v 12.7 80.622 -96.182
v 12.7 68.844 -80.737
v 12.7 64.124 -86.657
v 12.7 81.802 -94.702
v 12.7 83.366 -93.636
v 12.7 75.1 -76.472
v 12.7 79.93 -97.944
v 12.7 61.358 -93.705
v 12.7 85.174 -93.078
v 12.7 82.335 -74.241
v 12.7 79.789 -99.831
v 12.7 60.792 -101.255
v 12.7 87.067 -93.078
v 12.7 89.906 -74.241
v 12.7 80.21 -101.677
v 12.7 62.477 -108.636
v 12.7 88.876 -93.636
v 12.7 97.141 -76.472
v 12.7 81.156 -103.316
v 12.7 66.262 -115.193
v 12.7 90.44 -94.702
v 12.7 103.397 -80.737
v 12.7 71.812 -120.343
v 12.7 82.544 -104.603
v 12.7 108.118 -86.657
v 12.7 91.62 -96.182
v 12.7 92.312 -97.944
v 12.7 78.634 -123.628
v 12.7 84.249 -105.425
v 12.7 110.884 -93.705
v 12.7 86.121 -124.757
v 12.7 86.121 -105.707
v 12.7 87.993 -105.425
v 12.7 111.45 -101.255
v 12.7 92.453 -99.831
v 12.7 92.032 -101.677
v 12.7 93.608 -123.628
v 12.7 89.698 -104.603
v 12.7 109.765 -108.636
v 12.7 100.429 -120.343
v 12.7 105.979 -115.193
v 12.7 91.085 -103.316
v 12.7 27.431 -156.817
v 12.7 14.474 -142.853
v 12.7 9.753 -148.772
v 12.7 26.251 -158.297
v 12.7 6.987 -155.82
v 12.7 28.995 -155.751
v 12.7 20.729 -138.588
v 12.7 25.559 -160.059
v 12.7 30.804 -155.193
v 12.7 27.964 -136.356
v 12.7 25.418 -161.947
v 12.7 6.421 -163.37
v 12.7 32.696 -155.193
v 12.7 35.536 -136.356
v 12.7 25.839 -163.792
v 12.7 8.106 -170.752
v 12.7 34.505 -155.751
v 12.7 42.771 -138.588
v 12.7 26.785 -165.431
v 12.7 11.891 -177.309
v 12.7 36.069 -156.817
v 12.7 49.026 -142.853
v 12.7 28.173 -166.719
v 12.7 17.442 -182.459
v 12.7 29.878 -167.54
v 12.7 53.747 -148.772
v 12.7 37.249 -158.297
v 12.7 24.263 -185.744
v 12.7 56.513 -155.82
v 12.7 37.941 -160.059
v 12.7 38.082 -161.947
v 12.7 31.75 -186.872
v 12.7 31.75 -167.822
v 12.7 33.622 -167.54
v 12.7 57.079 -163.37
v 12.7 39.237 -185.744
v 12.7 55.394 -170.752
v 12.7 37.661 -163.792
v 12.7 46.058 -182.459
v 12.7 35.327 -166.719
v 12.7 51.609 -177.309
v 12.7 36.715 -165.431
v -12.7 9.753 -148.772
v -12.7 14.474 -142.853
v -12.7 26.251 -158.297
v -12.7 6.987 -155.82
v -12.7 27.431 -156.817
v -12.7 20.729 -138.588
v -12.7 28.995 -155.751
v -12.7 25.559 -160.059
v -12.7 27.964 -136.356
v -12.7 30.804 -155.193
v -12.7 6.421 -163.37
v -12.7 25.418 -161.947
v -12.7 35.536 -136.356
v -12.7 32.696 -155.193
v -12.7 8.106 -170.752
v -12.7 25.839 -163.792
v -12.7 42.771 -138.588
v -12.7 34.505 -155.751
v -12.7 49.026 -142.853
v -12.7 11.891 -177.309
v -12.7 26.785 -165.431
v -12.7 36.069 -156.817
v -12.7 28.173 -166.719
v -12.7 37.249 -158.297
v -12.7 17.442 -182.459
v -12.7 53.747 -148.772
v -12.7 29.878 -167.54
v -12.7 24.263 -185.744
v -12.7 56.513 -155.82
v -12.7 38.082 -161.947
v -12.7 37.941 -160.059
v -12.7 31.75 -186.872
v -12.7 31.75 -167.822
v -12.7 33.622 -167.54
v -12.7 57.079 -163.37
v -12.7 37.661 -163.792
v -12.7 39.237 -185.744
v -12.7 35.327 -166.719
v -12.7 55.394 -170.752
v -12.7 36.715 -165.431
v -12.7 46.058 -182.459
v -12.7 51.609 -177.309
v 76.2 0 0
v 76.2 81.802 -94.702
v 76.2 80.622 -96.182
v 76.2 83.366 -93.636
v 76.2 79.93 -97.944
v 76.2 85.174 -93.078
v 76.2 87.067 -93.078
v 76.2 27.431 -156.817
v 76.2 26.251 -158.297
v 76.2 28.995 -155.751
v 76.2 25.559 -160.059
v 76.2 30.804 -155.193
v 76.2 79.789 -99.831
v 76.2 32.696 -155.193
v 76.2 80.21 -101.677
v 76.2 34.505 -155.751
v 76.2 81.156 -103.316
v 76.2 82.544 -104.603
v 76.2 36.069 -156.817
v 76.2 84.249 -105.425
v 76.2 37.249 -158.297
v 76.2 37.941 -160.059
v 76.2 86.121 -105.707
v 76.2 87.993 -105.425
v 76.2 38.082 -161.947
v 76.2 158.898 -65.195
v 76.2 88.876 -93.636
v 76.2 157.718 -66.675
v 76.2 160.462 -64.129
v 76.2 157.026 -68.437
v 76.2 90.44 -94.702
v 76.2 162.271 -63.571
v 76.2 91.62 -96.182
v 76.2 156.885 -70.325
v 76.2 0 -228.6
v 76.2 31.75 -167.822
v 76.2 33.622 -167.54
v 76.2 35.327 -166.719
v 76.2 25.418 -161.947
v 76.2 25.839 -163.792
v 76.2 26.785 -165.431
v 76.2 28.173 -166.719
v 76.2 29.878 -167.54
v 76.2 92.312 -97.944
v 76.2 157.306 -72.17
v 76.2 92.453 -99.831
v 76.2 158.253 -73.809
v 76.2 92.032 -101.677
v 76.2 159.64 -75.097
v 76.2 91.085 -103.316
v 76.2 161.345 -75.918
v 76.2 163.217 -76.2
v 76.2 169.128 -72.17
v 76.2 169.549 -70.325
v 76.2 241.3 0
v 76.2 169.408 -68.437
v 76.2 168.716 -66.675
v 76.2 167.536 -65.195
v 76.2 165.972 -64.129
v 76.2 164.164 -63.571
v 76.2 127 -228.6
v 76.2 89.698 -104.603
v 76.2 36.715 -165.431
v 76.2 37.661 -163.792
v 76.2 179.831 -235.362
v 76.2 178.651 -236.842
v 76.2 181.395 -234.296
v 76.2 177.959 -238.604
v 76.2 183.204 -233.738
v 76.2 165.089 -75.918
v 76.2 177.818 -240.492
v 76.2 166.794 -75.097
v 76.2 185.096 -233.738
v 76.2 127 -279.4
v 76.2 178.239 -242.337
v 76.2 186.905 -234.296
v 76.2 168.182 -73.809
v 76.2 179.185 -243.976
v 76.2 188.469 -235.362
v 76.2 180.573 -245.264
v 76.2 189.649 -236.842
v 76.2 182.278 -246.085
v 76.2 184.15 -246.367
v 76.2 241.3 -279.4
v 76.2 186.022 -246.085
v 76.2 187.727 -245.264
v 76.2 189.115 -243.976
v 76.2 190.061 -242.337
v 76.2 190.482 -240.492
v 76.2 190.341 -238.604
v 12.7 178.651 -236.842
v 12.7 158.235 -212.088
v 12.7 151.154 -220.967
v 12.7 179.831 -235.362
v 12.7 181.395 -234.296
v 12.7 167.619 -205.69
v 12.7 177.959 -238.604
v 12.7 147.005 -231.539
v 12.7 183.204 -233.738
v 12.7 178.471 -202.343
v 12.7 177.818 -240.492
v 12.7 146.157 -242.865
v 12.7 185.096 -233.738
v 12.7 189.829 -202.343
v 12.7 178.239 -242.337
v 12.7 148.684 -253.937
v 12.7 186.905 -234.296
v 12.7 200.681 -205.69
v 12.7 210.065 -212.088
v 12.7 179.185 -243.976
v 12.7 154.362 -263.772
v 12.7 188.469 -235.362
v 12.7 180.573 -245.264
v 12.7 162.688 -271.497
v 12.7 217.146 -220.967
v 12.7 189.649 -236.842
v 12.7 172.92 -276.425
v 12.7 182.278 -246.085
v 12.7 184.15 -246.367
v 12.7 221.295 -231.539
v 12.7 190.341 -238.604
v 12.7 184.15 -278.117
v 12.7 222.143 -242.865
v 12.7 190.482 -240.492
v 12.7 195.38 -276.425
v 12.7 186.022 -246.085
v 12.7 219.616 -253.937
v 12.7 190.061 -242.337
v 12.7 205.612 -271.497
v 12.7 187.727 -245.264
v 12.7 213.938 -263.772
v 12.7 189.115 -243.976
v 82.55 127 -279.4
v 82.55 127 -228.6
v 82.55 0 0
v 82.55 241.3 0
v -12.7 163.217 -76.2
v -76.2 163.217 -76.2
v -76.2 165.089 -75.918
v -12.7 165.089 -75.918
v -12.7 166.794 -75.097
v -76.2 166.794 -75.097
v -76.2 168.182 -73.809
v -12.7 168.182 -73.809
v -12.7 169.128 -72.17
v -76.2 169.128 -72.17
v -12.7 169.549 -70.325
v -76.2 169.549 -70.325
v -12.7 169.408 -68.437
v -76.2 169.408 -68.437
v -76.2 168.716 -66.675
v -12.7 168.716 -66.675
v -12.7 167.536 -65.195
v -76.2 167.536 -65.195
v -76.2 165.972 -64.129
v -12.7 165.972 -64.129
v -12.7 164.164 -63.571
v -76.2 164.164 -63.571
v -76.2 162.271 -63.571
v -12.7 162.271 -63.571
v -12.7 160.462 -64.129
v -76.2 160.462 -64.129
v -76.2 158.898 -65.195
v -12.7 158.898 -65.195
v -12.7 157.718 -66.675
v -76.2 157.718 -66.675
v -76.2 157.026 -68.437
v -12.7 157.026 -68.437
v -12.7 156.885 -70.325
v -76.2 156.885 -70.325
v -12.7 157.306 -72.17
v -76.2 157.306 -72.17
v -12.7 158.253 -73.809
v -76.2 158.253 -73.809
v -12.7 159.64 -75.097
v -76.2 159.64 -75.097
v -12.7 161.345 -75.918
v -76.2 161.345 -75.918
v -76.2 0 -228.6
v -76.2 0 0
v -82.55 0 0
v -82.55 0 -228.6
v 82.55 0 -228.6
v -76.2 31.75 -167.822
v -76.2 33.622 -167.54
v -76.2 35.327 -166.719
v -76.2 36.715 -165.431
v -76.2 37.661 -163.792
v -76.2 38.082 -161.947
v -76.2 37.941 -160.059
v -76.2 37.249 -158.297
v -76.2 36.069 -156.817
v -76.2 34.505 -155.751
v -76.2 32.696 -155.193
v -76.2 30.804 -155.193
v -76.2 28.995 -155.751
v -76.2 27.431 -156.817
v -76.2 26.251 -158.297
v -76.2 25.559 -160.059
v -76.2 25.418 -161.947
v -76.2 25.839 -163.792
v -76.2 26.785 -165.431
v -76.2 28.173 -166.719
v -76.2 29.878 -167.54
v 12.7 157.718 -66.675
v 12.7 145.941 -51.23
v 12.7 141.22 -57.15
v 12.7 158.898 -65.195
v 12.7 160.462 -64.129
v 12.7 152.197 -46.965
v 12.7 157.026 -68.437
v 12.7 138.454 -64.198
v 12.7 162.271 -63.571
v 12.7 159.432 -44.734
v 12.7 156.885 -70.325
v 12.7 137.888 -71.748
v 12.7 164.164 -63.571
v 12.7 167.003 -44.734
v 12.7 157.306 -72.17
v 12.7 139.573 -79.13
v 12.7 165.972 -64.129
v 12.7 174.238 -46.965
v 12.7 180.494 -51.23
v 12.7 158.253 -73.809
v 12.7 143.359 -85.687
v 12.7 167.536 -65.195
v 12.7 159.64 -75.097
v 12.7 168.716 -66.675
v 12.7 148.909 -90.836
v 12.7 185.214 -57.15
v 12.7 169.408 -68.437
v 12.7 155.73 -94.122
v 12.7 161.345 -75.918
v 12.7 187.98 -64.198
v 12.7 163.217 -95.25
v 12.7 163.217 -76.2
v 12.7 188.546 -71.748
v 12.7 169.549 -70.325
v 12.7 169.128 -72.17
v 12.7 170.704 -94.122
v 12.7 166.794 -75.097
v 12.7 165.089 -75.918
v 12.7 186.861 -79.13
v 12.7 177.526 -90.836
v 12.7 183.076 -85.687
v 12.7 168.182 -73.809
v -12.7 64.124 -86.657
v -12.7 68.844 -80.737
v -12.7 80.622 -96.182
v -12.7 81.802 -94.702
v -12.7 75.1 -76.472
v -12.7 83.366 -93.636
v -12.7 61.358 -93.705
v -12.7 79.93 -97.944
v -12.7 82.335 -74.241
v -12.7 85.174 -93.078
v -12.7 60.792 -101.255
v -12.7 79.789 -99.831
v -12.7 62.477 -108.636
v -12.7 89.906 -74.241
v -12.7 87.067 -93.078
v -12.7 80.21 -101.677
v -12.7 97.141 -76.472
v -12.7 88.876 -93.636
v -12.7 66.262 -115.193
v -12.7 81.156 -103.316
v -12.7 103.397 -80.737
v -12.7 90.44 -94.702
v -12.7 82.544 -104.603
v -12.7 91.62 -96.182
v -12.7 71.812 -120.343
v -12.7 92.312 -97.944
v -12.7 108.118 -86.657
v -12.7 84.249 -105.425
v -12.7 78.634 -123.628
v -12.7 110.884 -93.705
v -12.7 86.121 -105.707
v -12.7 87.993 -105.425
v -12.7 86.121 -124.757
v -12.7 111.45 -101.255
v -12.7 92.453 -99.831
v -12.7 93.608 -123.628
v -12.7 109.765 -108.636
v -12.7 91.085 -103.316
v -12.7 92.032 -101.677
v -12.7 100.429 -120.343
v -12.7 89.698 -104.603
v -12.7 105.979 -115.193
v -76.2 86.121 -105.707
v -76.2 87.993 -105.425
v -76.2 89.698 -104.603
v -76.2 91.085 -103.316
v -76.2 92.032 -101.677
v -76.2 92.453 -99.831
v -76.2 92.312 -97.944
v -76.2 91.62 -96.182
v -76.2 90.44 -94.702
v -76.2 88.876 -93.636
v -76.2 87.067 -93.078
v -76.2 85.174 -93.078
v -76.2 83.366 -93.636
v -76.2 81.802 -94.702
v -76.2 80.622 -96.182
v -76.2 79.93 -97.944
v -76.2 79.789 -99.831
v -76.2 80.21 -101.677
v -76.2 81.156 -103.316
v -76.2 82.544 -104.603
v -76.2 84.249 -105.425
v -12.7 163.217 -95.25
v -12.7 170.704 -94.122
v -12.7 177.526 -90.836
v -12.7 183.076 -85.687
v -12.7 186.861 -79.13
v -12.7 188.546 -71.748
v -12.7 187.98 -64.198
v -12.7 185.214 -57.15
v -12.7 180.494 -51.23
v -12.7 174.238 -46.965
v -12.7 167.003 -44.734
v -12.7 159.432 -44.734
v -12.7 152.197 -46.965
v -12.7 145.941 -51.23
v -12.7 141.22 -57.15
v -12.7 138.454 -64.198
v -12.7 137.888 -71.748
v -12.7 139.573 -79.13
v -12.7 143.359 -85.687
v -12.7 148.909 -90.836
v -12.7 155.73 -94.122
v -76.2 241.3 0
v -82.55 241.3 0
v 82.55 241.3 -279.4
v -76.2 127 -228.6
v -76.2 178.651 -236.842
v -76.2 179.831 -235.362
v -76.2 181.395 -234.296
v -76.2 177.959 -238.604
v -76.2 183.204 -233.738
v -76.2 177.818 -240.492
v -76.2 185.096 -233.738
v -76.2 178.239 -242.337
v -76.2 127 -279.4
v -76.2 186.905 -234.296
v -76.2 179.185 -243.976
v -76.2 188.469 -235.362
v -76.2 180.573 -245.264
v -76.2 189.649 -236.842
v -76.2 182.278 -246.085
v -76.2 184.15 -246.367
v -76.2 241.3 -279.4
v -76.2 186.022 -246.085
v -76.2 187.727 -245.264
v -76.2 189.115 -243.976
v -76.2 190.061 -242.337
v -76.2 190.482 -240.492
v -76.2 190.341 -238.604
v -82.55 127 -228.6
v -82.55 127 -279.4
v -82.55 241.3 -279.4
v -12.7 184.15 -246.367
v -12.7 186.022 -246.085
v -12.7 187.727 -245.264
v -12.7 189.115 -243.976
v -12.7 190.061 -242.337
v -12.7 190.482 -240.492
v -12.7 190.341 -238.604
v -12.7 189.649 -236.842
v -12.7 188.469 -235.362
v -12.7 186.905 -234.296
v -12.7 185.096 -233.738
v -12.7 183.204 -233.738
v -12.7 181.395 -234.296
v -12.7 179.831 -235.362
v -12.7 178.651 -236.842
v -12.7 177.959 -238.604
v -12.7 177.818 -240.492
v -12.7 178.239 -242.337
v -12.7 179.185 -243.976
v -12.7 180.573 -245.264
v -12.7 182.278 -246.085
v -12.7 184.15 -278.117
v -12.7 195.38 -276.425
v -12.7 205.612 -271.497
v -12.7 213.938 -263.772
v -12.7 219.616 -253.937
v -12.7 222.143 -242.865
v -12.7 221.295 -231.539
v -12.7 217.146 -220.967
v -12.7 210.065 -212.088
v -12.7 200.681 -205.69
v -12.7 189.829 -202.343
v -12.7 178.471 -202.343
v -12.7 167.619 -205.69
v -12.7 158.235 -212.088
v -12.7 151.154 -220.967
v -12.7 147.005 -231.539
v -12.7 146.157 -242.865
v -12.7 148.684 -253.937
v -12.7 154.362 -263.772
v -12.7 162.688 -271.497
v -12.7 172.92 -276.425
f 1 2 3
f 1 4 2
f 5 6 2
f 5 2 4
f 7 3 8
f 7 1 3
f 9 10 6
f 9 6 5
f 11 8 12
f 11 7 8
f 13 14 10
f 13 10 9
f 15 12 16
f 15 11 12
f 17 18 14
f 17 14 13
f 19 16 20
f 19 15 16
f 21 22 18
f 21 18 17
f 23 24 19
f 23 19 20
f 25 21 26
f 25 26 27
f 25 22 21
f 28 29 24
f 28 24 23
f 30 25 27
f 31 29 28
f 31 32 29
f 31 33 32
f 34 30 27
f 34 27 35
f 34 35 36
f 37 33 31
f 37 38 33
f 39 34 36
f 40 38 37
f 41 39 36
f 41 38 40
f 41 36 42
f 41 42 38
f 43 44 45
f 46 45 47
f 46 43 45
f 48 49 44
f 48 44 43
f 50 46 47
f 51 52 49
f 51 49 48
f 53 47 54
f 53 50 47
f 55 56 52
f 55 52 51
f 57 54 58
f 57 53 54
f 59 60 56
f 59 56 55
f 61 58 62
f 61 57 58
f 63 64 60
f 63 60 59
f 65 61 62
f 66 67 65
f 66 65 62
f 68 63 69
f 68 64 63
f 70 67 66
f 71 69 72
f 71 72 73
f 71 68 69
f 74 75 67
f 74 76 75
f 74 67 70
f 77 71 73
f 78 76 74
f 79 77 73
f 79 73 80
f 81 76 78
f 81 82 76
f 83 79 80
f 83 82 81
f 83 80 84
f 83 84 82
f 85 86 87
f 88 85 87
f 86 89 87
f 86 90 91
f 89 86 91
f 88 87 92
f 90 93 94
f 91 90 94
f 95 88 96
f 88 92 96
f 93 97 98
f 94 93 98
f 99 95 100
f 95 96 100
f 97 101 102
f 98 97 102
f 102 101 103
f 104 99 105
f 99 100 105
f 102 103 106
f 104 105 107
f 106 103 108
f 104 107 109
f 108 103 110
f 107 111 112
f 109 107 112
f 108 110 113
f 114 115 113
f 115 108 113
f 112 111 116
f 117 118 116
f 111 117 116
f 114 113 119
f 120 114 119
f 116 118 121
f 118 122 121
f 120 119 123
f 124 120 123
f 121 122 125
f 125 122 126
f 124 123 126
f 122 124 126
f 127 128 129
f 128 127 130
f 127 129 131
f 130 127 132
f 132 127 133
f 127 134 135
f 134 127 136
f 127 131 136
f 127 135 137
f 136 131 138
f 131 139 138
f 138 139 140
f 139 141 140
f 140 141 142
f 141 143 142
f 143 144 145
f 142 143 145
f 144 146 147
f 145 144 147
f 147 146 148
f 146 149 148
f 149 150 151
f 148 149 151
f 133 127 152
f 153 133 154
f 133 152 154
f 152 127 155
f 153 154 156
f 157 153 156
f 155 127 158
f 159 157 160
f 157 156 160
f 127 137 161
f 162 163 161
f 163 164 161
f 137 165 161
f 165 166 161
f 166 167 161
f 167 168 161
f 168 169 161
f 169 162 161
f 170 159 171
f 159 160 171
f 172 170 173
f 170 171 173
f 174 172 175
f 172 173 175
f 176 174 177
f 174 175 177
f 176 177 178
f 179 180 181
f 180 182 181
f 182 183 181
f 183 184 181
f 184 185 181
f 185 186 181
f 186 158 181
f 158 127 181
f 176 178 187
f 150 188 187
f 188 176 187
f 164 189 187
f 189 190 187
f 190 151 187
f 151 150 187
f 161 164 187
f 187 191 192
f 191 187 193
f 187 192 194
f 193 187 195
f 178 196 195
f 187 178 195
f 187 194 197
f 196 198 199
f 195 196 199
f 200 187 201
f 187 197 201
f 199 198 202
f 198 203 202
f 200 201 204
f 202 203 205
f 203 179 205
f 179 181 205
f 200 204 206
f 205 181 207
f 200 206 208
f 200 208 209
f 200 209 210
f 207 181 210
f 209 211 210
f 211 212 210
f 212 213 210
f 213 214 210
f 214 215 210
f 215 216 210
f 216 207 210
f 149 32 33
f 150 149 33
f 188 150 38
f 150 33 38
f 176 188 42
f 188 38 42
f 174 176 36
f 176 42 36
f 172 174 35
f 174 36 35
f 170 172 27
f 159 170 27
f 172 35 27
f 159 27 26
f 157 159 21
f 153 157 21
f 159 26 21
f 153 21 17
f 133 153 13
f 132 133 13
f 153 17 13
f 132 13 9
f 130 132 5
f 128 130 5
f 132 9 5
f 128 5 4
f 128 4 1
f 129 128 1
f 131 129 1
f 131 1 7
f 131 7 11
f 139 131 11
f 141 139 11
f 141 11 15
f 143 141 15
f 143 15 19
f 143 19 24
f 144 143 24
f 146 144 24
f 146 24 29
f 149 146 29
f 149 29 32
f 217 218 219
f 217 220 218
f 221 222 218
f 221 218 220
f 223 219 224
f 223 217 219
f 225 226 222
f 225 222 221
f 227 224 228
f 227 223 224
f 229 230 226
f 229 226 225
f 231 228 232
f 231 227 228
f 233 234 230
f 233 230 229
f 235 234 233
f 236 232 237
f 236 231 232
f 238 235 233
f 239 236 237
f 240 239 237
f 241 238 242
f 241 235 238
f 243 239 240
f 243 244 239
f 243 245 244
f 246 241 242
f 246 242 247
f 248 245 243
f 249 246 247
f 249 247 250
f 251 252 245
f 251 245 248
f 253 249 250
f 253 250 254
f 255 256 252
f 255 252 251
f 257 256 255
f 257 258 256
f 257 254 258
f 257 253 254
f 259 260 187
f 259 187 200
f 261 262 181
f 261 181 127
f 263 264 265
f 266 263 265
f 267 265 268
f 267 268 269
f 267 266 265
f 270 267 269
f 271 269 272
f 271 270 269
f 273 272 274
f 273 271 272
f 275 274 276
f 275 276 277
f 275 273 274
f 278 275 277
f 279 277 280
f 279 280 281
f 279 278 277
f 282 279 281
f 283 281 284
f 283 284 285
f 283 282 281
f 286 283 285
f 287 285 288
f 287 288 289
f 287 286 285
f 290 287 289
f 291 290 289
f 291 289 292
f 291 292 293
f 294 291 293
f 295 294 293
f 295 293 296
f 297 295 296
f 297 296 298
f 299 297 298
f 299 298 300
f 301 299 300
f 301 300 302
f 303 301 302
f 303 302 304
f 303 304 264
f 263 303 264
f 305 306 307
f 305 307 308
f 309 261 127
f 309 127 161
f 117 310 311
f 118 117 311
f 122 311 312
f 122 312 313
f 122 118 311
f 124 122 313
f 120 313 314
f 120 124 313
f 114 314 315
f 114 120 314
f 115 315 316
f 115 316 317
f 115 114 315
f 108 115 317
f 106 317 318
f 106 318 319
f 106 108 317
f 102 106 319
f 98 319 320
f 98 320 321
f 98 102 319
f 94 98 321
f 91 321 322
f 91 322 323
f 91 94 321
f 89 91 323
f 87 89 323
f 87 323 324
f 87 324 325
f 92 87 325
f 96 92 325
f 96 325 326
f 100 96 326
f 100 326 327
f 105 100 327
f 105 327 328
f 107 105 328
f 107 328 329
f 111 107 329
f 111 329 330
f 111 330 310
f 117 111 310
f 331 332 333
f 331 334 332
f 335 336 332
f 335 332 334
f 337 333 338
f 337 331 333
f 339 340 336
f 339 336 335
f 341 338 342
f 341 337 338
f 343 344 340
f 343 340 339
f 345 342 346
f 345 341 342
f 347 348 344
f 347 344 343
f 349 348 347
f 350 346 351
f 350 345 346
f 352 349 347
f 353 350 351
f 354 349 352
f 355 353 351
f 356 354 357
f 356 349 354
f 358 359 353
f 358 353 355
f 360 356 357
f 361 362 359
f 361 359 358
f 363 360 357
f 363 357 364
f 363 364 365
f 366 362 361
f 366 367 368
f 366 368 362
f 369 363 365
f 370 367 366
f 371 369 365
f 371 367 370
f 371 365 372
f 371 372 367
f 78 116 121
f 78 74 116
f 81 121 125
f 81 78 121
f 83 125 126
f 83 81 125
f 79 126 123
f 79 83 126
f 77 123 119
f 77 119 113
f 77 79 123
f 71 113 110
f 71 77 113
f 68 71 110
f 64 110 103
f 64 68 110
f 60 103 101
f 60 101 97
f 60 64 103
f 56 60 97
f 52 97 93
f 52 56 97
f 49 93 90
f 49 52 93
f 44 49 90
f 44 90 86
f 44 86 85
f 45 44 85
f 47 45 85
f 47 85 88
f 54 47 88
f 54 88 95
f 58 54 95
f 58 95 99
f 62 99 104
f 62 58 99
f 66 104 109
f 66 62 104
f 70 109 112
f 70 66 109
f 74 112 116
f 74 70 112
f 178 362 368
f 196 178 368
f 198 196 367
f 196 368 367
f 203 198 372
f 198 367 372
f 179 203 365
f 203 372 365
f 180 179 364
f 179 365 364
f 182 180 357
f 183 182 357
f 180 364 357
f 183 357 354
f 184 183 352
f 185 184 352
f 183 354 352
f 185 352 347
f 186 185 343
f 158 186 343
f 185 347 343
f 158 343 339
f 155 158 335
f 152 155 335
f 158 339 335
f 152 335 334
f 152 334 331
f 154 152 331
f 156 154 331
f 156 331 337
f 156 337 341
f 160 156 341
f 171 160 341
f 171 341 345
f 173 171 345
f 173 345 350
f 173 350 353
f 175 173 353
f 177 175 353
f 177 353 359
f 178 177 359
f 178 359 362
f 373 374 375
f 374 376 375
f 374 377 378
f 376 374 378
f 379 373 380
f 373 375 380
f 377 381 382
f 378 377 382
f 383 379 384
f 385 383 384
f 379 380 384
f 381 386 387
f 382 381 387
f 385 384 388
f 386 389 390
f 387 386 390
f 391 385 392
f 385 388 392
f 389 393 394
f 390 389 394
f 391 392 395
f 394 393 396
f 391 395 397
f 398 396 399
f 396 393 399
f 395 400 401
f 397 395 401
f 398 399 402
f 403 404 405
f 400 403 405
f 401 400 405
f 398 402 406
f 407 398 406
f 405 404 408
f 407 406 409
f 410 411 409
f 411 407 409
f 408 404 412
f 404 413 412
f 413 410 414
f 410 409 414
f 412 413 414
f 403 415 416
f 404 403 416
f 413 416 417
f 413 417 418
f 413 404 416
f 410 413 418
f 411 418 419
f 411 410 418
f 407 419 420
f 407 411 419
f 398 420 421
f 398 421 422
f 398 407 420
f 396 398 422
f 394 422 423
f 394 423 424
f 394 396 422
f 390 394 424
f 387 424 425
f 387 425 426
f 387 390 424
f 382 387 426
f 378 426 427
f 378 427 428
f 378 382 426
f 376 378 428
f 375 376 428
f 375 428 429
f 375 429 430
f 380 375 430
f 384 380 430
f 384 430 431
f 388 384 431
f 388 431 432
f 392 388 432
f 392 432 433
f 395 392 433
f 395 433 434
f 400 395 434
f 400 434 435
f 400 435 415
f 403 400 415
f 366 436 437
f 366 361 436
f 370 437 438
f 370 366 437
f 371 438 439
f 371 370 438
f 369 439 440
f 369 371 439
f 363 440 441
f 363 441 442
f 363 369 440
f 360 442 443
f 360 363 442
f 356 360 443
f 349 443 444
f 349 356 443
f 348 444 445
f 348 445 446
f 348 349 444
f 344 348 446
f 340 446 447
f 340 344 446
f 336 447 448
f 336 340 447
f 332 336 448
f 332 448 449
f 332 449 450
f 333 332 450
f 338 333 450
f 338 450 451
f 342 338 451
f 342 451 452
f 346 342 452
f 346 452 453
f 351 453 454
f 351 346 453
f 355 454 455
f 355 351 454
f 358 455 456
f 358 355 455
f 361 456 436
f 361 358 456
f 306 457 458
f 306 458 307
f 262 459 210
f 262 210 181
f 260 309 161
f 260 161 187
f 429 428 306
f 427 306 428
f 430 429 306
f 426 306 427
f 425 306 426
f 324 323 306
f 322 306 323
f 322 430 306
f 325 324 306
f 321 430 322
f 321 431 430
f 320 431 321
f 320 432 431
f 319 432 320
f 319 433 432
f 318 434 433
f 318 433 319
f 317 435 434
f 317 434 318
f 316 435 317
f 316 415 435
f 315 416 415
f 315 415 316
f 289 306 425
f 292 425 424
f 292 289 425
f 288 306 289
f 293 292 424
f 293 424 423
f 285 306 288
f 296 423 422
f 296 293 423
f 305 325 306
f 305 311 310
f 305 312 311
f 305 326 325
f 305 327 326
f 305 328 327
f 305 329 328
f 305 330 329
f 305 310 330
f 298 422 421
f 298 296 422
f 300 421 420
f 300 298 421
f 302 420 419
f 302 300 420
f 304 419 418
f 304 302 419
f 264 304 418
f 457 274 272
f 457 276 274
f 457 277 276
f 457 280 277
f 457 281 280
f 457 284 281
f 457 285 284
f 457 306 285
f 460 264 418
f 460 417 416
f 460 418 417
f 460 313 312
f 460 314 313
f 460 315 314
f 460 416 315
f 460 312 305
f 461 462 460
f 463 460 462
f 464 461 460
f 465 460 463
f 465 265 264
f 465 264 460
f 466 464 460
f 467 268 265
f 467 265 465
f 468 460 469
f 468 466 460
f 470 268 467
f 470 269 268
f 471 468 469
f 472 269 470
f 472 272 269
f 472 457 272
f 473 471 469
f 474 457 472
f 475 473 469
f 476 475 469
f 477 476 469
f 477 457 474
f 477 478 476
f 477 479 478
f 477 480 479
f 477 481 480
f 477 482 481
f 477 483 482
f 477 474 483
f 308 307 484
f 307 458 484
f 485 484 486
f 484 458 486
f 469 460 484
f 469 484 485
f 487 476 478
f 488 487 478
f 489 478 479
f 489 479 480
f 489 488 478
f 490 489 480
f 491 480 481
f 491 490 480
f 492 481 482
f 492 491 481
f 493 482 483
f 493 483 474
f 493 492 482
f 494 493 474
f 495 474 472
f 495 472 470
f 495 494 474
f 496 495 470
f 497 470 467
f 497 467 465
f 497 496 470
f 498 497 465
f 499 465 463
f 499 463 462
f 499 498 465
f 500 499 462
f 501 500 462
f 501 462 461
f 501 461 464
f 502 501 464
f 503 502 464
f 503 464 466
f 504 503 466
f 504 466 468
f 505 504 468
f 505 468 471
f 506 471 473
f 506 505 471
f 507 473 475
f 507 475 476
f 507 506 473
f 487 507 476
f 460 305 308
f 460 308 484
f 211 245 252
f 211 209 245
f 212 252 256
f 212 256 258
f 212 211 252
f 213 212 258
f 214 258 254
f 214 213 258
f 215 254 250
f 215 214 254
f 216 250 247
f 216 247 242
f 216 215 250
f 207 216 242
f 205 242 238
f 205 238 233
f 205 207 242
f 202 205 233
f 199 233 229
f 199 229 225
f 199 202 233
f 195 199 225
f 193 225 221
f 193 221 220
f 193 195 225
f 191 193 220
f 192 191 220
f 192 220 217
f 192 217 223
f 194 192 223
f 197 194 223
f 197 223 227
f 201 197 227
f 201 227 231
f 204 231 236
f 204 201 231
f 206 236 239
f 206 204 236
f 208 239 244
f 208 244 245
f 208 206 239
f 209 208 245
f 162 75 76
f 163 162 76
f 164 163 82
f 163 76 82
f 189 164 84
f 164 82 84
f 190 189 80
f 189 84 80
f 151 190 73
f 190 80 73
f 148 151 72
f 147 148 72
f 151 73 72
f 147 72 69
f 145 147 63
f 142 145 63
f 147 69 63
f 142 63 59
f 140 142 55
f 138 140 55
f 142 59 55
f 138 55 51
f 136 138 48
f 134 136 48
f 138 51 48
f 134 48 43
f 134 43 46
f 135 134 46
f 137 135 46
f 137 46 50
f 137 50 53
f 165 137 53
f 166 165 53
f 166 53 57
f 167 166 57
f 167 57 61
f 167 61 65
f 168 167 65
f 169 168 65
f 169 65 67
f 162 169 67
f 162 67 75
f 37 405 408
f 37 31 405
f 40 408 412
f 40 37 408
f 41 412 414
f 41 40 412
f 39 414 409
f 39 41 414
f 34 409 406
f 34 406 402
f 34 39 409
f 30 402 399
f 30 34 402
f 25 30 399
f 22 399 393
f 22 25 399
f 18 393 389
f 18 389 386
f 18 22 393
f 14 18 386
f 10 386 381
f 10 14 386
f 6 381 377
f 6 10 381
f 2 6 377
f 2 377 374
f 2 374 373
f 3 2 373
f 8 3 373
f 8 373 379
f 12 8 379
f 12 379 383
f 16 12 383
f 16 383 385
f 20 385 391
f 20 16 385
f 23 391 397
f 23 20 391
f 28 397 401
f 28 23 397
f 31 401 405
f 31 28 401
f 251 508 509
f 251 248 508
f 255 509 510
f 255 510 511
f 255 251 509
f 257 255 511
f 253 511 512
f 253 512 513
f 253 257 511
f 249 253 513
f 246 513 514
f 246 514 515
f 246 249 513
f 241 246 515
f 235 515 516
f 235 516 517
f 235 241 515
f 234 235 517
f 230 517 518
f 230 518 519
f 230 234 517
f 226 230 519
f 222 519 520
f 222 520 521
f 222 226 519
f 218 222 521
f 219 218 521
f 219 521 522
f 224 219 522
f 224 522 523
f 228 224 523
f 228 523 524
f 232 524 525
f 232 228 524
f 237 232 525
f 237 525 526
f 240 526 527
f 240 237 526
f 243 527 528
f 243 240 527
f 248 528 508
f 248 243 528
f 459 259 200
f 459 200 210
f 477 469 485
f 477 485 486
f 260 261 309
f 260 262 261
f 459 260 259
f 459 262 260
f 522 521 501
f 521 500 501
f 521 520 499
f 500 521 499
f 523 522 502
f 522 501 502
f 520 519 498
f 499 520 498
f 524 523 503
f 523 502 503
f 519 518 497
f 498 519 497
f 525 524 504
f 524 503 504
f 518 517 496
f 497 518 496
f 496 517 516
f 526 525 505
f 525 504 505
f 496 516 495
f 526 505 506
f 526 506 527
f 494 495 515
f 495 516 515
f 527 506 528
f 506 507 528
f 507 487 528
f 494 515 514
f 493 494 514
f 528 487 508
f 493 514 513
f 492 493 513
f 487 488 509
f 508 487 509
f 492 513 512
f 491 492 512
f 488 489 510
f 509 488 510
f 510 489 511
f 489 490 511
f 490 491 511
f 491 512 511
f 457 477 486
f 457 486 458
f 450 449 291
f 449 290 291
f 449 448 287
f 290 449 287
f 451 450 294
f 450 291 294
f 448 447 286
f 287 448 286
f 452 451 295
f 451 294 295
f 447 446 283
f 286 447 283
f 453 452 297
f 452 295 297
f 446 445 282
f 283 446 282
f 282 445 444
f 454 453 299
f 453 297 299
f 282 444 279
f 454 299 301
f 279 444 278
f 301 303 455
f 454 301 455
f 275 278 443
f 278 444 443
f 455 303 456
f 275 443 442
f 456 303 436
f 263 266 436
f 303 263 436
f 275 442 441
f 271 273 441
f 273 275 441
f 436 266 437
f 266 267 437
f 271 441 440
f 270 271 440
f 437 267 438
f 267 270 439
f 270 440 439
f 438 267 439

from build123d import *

# Parameters (mm, degrees)
BOSS_EXTRUDE1_DEPTH   = 82.55
SKETCH2_W             = 152.4
SKETCH2_H             = 279.4
CUT_EXTRUDE1_DEPTH    = 242.3
SKETCH3_R             = 25.4
BOSS_EXTRUDE2_DEPTH   = 12.7
SKETCH3_R_2           = 38.1
BOSS_EXTRUDE2_2_DEPTH = 12.7
BOSS_EXTRUDE2_3_DEPTH = 12.7
BOSS_EXTRUDE2_4_DEPTH = 12.7
SKETCH4_R             = 6.35
BOSS_EXTRUDE3_DEPTH   = 76.2


with BuildPart() as part:
    # Sketch1 → Boss-Extrude1 (new body, symmetric)
    with BuildSketch(Plane(origin=(0, 0, 0), x_dir=(0, 0, -1), z_dir=(1, 0, 0))):
        Polygon((0, 0), (228.6, 0), (228.6, 127), (279.4, 127), (279.4, 241.3), (0, 241.3), align=None)
    extrude(amount=BOSS_EXTRUDE1_DEPTH, both=True)

    # Sketch2 → Cut-Extrude1 (cut, through all)
    with BuildSketch(Plane(origin=(0, 241.3, 0), x_dir=(1, 0, 0), z_dir=(0, 1, 0))):
        with Locations((0, 139.7)):
            Rectangle(SKETCH2_W, SKETCH2_H)
    extrude(amount=-CUT_EXTRUDE1_DEPTH, mode=Mode.SUBTRACT)



with BuildPart() as body_2:
    # Sketch3 → Boss-Extrude2 (new body, symmetric)
    with BuildSketch(Plane(origin=(0, 0, 0), x_dir=(0, 0, -1), z_dir=(1, 0, 0))):
        with Locations((161.472166443, 31.75)):
            Circle(SKETCH3_R)
    extrude(amount=BOSS_EXTRUDE2_DEPTH, both=True)


with BuildPart() as body_3:
    # Sketch3 → Boss-Extrude2 2 (new body, symmetric)
    with BuildSketch(Plane(origin=(0, 0, 0), x_dir=(0, 0, -1), z_dir=(1, 0, 0))):
        with Locations((240.017328611, 184.15)):
            Circle(SKETCH3_R_2)
    extrude(amount=BOSS_EXTRUDE2_2_DEPTH, both=True)


with BuildPart() as body_4:
    # Sketch3 → Boss-Extrude2 3 (new body, symmetric)
    with BuildSketch(Plane(origin=(0, 0, 0), x_dir=(0, 0, -1), z_dir=(1, 0, 0))):
        with Locations((69.85, 163.217184297)):
            Circle(SKETCH3_R)
    extrude(amount=BOSS_EXTRUDE2_3_DEPTH, both=True)


with BuildPart() as body_5:
    # Sketch3 → Boss-Extrude2 4 (new body, symmetric)
    with BuildSketch(Plane(origin=(0, 0, 0), x_dir=(0, 0, -1), z_dir=(1, 0, 0))):
        with Locations((99.356812104, 86.120812531)):
            Circle(SKETCH3_R)
    extrude(amount=BOSS_EXTRUDE2_4_DEPTH, both=True)


with BuildPart() as part_1:
    add(part.part)

    add(body_2.part)  # Boss-Extrude3 merges body 2

    add(body_3.part)  # Boss-Extrude3 merges body 3

    add(body_4.part)  # Boss-Extrude3 merges body 4

    add(body_5.part)  # Boss-Extrude3 merges body 5
    # Sketch4 → Boss-Extrude3 (add, symmetric)
    with BuildSketch(Plane(origin=(0, 0, 0), x_dir=(0, 0, -1), z_dir=(1, 0, 0))):
        with Locations((69.85, 163.217184297)):
            Circle(SKETCH4_R)
        with Locations((99.356812104, 86.120812531)):
            Circle(SKETCH4_R)
        with Locations((161.472166443, 31.75)):
            Circle(SKETCH4_R)
        with Locations((240.017328611, 184.15)):
            Circle(SKETCH4_R)
    extrude(amount=BOSS_EXTRUDE3_DEPTH, both=True)


solid = part_1.part
